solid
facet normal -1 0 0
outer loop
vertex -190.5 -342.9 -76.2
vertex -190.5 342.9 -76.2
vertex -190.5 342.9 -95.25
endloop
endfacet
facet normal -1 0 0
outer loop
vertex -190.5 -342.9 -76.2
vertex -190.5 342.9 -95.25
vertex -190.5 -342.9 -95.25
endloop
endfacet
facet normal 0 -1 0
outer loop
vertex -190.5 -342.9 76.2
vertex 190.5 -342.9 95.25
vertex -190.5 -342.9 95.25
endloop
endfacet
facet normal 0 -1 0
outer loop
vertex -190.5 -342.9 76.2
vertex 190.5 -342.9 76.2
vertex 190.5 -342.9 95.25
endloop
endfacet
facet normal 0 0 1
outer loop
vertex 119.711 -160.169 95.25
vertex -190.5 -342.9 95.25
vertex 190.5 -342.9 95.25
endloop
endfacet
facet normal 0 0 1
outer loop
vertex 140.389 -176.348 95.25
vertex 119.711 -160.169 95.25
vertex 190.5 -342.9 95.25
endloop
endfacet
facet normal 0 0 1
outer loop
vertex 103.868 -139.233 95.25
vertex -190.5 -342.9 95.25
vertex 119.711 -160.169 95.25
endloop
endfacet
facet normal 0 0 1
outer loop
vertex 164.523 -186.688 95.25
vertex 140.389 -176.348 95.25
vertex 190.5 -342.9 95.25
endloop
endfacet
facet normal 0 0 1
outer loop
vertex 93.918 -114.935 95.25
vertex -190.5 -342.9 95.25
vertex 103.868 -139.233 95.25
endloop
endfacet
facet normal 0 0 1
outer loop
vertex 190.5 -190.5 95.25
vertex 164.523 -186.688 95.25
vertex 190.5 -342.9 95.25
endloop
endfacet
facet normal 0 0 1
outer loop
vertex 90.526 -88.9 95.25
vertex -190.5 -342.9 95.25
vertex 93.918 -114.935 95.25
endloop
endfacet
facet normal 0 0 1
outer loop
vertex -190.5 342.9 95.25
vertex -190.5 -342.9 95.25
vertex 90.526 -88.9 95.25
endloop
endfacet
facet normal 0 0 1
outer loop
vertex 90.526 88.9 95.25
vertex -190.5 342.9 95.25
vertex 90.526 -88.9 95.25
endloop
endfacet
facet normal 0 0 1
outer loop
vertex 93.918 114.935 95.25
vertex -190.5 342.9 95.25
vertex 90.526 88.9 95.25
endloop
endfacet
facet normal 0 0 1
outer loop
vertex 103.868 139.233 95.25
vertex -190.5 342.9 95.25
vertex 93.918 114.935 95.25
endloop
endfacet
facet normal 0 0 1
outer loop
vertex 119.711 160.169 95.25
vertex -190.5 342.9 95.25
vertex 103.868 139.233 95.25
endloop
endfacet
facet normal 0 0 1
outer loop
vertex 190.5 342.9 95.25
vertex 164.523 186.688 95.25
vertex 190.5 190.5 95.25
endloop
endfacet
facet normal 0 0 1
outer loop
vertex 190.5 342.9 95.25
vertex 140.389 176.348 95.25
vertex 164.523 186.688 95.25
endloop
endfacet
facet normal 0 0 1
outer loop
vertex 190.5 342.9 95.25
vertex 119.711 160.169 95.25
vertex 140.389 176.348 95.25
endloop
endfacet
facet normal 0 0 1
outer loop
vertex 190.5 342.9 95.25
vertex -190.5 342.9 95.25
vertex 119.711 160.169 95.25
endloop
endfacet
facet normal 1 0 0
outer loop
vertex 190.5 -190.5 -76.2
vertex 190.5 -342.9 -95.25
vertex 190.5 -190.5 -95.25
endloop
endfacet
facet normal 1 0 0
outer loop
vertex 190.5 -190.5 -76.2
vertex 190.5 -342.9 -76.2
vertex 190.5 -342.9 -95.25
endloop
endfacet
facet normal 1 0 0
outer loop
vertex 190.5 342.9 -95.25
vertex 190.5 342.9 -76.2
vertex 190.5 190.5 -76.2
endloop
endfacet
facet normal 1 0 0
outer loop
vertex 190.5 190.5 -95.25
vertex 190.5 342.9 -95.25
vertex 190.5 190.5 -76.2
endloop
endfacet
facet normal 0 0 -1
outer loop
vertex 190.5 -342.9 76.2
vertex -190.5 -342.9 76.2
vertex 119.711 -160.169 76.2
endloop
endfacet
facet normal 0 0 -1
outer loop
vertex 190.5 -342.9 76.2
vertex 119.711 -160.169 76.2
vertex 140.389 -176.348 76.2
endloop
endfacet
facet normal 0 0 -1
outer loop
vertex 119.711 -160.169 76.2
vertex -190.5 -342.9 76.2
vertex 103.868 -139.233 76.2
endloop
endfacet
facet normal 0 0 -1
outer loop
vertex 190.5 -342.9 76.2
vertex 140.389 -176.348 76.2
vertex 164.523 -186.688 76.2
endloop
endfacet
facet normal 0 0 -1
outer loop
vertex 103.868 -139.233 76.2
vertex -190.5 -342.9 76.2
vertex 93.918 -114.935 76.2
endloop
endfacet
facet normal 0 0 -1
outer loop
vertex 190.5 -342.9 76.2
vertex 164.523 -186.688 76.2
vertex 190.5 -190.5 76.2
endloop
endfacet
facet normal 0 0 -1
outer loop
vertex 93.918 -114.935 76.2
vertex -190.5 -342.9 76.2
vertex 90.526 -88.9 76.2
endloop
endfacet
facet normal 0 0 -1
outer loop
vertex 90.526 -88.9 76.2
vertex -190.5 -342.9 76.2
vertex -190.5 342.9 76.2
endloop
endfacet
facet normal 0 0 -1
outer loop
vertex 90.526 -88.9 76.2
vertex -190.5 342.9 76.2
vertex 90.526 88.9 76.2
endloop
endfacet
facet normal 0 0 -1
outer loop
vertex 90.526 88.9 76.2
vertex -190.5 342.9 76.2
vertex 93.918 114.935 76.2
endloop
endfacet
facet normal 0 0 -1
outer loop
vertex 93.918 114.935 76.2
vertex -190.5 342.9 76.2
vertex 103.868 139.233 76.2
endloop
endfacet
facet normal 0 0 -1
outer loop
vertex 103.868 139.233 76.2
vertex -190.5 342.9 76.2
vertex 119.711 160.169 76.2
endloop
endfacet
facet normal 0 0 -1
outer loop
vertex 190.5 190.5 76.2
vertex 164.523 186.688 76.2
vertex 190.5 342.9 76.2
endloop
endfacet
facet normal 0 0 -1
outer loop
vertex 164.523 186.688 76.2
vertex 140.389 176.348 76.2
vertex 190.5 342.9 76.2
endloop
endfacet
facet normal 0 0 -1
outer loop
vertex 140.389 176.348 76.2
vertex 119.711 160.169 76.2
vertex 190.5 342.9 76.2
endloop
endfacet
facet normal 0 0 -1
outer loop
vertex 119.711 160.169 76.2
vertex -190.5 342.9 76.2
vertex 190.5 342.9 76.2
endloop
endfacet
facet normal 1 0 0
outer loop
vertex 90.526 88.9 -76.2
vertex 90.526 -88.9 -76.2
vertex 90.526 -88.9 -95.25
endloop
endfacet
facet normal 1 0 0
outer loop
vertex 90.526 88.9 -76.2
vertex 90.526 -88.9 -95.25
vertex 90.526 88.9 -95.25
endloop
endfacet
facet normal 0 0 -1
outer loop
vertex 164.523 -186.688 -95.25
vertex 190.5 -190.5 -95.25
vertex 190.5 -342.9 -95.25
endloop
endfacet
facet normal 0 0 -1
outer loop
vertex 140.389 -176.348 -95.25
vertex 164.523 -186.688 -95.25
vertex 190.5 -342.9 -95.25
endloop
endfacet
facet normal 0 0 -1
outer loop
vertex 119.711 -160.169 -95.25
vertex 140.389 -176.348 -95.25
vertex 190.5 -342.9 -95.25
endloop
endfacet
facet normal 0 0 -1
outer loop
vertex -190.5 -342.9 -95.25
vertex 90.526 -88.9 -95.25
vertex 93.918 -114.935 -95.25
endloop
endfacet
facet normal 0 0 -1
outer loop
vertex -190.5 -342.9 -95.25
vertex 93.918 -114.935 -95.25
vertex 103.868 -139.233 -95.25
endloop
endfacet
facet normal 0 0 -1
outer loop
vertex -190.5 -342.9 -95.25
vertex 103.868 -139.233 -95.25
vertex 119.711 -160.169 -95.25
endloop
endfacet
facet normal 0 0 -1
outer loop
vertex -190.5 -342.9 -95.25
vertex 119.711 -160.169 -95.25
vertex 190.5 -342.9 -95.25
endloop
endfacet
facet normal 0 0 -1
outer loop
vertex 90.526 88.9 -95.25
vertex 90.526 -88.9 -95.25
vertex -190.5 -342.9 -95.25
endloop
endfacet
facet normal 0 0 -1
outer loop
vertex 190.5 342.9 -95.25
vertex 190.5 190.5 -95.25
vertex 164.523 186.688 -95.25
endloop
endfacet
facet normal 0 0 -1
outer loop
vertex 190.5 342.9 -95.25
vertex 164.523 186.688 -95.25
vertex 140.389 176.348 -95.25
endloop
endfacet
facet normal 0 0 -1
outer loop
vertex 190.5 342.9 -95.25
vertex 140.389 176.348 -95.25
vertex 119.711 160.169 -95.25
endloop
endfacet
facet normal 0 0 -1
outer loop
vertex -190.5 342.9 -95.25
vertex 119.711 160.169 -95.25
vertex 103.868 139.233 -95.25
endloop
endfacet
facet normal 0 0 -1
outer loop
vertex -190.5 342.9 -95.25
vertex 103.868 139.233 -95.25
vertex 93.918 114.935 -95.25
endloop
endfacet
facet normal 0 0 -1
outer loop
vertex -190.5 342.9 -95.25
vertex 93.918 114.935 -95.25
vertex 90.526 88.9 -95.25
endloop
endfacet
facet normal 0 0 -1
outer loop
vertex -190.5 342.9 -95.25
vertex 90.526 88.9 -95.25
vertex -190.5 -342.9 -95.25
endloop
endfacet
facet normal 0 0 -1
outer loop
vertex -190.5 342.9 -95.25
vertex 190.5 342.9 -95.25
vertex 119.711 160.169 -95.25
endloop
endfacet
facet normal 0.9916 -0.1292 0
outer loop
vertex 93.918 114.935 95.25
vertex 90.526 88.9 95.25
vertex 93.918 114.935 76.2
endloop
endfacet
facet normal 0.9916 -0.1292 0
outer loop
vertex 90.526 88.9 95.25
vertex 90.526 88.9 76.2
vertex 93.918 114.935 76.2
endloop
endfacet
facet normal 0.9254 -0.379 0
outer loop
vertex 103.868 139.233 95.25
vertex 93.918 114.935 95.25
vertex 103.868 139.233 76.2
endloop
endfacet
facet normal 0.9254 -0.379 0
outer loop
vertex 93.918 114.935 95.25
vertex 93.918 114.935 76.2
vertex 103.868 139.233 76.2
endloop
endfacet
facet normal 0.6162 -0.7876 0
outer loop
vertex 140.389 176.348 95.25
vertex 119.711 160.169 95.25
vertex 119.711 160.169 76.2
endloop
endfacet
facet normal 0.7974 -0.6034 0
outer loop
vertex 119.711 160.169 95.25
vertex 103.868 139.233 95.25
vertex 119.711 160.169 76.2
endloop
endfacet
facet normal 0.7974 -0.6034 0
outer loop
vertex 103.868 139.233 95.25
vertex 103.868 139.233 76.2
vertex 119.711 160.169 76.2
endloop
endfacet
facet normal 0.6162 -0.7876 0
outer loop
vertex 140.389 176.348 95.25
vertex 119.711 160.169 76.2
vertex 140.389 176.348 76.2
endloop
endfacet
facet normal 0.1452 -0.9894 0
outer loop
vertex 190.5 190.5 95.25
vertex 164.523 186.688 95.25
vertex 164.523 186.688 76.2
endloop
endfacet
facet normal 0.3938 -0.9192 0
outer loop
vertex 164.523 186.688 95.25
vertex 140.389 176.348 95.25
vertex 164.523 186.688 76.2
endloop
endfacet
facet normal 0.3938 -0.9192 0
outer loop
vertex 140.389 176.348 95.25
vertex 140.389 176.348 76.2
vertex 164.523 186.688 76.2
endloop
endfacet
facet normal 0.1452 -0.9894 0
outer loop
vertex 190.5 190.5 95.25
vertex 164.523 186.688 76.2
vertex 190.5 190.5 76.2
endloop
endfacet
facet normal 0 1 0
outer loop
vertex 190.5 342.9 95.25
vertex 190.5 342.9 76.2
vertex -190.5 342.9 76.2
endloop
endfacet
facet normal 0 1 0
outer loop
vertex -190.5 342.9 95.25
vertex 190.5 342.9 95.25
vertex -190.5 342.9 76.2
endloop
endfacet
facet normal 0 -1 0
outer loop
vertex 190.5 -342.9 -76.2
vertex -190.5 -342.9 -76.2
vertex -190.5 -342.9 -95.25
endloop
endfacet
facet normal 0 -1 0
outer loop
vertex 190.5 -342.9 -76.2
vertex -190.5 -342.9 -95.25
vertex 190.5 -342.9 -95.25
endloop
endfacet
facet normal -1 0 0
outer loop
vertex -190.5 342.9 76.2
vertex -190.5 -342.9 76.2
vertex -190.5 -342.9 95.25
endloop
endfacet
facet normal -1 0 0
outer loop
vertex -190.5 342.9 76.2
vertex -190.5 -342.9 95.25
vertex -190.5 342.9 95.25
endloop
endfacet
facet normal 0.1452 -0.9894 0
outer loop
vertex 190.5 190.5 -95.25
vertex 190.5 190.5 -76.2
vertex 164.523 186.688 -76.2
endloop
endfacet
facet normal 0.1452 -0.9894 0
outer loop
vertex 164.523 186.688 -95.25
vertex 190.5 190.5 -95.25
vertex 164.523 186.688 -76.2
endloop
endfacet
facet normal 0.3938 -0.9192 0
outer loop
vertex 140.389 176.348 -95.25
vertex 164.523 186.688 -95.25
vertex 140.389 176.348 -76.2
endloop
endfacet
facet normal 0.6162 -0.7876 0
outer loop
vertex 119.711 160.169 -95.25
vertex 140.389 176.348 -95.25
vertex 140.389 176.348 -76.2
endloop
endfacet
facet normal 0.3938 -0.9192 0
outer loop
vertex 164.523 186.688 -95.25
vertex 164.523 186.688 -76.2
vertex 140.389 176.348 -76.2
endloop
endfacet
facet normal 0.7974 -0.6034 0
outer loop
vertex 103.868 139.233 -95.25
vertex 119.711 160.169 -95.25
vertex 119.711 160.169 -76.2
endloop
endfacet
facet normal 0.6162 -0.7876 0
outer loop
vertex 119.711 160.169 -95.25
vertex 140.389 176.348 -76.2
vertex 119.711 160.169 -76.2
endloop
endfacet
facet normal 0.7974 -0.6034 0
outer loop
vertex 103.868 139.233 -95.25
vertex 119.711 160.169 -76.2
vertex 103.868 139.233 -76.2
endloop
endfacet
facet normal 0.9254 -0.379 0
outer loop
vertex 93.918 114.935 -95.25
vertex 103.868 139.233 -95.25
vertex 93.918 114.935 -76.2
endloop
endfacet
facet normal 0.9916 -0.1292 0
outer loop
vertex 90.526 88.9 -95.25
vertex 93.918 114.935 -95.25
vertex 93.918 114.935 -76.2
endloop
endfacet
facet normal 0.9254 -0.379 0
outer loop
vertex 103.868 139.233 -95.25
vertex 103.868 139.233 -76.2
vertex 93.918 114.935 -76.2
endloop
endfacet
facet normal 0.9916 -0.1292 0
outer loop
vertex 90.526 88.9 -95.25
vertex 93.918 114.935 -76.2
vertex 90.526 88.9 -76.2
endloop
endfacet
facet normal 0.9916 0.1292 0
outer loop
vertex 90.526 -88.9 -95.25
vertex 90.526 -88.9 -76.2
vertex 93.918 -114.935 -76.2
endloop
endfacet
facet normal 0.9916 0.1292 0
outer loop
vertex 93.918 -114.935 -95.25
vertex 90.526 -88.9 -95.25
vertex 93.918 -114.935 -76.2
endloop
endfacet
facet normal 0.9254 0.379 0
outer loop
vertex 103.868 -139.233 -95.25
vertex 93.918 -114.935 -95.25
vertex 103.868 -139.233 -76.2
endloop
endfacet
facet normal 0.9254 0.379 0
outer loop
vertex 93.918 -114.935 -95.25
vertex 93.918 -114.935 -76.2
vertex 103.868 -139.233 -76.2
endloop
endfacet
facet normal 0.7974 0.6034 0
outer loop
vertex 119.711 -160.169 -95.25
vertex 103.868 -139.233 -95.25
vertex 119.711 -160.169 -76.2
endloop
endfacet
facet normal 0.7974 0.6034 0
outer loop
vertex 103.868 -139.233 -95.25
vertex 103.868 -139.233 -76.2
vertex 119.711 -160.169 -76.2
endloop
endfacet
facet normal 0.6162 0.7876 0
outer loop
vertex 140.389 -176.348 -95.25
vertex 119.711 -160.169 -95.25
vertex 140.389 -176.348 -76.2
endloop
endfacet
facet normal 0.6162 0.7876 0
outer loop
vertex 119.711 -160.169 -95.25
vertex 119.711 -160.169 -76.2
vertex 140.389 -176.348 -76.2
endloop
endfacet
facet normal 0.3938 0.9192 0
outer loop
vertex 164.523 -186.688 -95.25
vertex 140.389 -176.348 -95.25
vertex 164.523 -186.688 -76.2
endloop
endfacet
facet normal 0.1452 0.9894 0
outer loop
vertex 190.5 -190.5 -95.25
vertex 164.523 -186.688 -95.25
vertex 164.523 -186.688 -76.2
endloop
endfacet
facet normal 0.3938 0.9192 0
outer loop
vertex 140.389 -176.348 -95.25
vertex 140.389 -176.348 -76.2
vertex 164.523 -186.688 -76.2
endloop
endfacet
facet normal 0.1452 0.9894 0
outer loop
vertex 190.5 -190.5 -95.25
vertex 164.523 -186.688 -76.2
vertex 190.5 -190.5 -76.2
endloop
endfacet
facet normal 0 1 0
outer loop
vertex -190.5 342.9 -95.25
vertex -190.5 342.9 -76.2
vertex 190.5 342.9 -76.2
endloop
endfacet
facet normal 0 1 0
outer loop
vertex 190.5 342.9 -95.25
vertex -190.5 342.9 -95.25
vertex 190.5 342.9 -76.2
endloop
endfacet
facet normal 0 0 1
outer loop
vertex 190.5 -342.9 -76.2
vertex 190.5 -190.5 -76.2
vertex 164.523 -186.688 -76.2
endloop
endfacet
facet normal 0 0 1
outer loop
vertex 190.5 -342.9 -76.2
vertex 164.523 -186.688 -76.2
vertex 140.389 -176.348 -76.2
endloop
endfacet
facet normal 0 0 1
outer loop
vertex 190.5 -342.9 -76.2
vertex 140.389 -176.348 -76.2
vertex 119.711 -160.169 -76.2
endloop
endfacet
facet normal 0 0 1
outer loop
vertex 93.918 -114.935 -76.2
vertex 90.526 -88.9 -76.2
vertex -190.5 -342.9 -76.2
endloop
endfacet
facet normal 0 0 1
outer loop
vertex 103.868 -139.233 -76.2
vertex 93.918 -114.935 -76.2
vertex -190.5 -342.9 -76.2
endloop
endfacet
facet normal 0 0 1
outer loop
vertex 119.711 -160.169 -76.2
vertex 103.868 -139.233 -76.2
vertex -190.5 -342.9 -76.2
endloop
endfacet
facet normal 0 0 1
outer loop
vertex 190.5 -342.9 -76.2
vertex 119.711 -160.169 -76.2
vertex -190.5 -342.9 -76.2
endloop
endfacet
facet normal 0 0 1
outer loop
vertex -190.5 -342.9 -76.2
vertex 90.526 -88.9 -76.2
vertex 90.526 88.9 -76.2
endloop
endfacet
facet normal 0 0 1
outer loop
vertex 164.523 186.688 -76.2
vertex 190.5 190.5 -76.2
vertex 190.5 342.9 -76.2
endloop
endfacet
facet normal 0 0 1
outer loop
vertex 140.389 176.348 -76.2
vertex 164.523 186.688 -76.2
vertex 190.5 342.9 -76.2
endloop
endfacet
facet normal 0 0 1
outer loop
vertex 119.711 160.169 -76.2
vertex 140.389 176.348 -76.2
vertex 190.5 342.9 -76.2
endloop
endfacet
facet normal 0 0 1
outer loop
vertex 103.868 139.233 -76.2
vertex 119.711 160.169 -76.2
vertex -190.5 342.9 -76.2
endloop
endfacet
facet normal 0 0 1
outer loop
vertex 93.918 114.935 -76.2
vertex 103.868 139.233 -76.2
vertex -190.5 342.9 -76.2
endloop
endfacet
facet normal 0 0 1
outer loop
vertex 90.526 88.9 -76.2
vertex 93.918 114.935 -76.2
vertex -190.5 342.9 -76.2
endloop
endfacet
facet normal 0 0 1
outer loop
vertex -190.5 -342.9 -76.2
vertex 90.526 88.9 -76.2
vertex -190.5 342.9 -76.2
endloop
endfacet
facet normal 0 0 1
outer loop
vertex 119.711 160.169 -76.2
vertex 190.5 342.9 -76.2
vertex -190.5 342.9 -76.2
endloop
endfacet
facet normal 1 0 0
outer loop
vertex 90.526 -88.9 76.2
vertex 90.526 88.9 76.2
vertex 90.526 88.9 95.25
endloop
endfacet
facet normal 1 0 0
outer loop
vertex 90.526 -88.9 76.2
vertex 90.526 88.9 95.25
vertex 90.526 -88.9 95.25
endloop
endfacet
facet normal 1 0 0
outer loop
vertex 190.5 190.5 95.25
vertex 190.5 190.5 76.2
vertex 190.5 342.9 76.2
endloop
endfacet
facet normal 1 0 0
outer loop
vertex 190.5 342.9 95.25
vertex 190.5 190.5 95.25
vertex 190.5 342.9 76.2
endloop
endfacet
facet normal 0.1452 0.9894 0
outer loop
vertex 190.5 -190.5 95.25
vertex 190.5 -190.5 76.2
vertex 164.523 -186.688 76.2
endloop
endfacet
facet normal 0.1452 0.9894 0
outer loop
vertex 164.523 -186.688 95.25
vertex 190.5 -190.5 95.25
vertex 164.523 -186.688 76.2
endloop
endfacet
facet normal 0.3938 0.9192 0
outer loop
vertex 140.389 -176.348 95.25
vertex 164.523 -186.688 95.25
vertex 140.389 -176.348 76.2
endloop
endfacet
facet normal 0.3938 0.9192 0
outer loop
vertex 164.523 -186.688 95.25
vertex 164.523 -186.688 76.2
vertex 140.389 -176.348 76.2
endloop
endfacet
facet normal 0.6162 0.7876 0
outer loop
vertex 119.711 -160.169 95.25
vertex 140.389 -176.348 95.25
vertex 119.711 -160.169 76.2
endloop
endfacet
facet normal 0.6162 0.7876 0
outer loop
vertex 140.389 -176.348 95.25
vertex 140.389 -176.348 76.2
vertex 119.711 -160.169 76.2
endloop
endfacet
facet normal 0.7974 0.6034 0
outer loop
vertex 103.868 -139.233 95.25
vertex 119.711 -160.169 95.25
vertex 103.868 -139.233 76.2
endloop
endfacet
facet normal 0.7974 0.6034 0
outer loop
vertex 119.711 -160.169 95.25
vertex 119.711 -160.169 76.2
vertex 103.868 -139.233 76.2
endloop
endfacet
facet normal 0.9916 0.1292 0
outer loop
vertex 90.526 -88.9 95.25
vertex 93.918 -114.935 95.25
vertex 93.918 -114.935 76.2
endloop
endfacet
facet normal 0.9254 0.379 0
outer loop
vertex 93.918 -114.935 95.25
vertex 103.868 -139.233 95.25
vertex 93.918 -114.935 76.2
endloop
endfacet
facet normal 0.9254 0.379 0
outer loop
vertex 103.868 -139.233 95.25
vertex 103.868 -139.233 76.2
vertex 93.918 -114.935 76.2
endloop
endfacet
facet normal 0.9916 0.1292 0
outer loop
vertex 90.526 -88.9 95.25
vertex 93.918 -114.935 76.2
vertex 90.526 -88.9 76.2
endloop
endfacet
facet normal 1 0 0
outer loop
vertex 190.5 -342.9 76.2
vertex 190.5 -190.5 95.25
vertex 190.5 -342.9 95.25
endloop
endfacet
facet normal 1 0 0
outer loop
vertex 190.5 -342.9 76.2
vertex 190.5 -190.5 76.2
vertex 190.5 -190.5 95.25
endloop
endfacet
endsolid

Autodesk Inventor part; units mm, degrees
ref_plane "YZ Plane" through (0, 0, 0) normal (1, 0, 0) x (0, 1, 0)
ref_plane "XZ Plane" through (0, 0, 0) normal (0, 1, 0) x (-1, 0, 0)
ref_plane "Work Plane2" through (0, 0, 76.2) normal (0, 0, 1) x (1, 0, 0)
sketch "Sketch1" plane through (0, 0, 76.2) normal (0, 0, 1) x (1, 0, 0)
  line L0 (190.5, -190.5) -> (-190.5, -190.5)
  line L1 (-190.5, -190.5) -> (-190.5, 190.5)
  line L2 (-190.5, 190.5) -> (190.5, 190.5)
  line L3 (190.5, 190.5) -> (190.5, -190.5) construction
  line L4 (190.5, -190.5) -> (-190.5, 190.5) construction
  line L5 (-190.5, -190.5) -> (190.5, 190.5) construction
  line L6 (90.5263, 88.9) -> (90.5263, -88.9)
  arc A0 (190.5, 190.5) -> (90.5263, 88.9) centre (192.1395, 88.9) ccw
  arc A1 (90.5263, -88.9) -> (190.5, -190.5) centre (192.1395, -88.9) ccw
  line L7 (-190.5, 190.5) -> (190.5, 190.5)
  line L8 (190.5, 190.5) -> (190.5, 342.9)
  line L9 (190.5, 342.9) -> (-190.5, 342.9)
  line L10 (-190.5, 342.9) -> (-190.5, 190.5)
  line L11 (-190.5, -190.5) -> (190.5, -190.5)
  line L12 (190.5, -190.5) -> (190.5, -342.9)
  line L13 (190.5, -342.9) -> (-190.5, -342.9)
  line L14 (-190.5, -342.9) -> (-190.5, -190.5)
  point P0 (0, 0)
  point P1 (190.5, -190.5)
  dimension "d2" = 381
  dimension "d3" = 381
  dimension "d4" = 101.6
  dimension "d5" = 101.6
  dimension "d8" = 152.4
  dimension "d9" = 152.4
extrude "Extrusion1" add sketch "Sketch1" along normal blind 19.05
mirror "Mirror1" about plane through (0, 0, 0) normal (0, 0, 1) of "Extrusion1"
equation "\"distanceBetweenPlates\" = 152.4"
equation "\"d1\" = 0.5 * distanceBetweenPlates"
properties part number "shooterCircularCurve" material "Wood (Oak)"
